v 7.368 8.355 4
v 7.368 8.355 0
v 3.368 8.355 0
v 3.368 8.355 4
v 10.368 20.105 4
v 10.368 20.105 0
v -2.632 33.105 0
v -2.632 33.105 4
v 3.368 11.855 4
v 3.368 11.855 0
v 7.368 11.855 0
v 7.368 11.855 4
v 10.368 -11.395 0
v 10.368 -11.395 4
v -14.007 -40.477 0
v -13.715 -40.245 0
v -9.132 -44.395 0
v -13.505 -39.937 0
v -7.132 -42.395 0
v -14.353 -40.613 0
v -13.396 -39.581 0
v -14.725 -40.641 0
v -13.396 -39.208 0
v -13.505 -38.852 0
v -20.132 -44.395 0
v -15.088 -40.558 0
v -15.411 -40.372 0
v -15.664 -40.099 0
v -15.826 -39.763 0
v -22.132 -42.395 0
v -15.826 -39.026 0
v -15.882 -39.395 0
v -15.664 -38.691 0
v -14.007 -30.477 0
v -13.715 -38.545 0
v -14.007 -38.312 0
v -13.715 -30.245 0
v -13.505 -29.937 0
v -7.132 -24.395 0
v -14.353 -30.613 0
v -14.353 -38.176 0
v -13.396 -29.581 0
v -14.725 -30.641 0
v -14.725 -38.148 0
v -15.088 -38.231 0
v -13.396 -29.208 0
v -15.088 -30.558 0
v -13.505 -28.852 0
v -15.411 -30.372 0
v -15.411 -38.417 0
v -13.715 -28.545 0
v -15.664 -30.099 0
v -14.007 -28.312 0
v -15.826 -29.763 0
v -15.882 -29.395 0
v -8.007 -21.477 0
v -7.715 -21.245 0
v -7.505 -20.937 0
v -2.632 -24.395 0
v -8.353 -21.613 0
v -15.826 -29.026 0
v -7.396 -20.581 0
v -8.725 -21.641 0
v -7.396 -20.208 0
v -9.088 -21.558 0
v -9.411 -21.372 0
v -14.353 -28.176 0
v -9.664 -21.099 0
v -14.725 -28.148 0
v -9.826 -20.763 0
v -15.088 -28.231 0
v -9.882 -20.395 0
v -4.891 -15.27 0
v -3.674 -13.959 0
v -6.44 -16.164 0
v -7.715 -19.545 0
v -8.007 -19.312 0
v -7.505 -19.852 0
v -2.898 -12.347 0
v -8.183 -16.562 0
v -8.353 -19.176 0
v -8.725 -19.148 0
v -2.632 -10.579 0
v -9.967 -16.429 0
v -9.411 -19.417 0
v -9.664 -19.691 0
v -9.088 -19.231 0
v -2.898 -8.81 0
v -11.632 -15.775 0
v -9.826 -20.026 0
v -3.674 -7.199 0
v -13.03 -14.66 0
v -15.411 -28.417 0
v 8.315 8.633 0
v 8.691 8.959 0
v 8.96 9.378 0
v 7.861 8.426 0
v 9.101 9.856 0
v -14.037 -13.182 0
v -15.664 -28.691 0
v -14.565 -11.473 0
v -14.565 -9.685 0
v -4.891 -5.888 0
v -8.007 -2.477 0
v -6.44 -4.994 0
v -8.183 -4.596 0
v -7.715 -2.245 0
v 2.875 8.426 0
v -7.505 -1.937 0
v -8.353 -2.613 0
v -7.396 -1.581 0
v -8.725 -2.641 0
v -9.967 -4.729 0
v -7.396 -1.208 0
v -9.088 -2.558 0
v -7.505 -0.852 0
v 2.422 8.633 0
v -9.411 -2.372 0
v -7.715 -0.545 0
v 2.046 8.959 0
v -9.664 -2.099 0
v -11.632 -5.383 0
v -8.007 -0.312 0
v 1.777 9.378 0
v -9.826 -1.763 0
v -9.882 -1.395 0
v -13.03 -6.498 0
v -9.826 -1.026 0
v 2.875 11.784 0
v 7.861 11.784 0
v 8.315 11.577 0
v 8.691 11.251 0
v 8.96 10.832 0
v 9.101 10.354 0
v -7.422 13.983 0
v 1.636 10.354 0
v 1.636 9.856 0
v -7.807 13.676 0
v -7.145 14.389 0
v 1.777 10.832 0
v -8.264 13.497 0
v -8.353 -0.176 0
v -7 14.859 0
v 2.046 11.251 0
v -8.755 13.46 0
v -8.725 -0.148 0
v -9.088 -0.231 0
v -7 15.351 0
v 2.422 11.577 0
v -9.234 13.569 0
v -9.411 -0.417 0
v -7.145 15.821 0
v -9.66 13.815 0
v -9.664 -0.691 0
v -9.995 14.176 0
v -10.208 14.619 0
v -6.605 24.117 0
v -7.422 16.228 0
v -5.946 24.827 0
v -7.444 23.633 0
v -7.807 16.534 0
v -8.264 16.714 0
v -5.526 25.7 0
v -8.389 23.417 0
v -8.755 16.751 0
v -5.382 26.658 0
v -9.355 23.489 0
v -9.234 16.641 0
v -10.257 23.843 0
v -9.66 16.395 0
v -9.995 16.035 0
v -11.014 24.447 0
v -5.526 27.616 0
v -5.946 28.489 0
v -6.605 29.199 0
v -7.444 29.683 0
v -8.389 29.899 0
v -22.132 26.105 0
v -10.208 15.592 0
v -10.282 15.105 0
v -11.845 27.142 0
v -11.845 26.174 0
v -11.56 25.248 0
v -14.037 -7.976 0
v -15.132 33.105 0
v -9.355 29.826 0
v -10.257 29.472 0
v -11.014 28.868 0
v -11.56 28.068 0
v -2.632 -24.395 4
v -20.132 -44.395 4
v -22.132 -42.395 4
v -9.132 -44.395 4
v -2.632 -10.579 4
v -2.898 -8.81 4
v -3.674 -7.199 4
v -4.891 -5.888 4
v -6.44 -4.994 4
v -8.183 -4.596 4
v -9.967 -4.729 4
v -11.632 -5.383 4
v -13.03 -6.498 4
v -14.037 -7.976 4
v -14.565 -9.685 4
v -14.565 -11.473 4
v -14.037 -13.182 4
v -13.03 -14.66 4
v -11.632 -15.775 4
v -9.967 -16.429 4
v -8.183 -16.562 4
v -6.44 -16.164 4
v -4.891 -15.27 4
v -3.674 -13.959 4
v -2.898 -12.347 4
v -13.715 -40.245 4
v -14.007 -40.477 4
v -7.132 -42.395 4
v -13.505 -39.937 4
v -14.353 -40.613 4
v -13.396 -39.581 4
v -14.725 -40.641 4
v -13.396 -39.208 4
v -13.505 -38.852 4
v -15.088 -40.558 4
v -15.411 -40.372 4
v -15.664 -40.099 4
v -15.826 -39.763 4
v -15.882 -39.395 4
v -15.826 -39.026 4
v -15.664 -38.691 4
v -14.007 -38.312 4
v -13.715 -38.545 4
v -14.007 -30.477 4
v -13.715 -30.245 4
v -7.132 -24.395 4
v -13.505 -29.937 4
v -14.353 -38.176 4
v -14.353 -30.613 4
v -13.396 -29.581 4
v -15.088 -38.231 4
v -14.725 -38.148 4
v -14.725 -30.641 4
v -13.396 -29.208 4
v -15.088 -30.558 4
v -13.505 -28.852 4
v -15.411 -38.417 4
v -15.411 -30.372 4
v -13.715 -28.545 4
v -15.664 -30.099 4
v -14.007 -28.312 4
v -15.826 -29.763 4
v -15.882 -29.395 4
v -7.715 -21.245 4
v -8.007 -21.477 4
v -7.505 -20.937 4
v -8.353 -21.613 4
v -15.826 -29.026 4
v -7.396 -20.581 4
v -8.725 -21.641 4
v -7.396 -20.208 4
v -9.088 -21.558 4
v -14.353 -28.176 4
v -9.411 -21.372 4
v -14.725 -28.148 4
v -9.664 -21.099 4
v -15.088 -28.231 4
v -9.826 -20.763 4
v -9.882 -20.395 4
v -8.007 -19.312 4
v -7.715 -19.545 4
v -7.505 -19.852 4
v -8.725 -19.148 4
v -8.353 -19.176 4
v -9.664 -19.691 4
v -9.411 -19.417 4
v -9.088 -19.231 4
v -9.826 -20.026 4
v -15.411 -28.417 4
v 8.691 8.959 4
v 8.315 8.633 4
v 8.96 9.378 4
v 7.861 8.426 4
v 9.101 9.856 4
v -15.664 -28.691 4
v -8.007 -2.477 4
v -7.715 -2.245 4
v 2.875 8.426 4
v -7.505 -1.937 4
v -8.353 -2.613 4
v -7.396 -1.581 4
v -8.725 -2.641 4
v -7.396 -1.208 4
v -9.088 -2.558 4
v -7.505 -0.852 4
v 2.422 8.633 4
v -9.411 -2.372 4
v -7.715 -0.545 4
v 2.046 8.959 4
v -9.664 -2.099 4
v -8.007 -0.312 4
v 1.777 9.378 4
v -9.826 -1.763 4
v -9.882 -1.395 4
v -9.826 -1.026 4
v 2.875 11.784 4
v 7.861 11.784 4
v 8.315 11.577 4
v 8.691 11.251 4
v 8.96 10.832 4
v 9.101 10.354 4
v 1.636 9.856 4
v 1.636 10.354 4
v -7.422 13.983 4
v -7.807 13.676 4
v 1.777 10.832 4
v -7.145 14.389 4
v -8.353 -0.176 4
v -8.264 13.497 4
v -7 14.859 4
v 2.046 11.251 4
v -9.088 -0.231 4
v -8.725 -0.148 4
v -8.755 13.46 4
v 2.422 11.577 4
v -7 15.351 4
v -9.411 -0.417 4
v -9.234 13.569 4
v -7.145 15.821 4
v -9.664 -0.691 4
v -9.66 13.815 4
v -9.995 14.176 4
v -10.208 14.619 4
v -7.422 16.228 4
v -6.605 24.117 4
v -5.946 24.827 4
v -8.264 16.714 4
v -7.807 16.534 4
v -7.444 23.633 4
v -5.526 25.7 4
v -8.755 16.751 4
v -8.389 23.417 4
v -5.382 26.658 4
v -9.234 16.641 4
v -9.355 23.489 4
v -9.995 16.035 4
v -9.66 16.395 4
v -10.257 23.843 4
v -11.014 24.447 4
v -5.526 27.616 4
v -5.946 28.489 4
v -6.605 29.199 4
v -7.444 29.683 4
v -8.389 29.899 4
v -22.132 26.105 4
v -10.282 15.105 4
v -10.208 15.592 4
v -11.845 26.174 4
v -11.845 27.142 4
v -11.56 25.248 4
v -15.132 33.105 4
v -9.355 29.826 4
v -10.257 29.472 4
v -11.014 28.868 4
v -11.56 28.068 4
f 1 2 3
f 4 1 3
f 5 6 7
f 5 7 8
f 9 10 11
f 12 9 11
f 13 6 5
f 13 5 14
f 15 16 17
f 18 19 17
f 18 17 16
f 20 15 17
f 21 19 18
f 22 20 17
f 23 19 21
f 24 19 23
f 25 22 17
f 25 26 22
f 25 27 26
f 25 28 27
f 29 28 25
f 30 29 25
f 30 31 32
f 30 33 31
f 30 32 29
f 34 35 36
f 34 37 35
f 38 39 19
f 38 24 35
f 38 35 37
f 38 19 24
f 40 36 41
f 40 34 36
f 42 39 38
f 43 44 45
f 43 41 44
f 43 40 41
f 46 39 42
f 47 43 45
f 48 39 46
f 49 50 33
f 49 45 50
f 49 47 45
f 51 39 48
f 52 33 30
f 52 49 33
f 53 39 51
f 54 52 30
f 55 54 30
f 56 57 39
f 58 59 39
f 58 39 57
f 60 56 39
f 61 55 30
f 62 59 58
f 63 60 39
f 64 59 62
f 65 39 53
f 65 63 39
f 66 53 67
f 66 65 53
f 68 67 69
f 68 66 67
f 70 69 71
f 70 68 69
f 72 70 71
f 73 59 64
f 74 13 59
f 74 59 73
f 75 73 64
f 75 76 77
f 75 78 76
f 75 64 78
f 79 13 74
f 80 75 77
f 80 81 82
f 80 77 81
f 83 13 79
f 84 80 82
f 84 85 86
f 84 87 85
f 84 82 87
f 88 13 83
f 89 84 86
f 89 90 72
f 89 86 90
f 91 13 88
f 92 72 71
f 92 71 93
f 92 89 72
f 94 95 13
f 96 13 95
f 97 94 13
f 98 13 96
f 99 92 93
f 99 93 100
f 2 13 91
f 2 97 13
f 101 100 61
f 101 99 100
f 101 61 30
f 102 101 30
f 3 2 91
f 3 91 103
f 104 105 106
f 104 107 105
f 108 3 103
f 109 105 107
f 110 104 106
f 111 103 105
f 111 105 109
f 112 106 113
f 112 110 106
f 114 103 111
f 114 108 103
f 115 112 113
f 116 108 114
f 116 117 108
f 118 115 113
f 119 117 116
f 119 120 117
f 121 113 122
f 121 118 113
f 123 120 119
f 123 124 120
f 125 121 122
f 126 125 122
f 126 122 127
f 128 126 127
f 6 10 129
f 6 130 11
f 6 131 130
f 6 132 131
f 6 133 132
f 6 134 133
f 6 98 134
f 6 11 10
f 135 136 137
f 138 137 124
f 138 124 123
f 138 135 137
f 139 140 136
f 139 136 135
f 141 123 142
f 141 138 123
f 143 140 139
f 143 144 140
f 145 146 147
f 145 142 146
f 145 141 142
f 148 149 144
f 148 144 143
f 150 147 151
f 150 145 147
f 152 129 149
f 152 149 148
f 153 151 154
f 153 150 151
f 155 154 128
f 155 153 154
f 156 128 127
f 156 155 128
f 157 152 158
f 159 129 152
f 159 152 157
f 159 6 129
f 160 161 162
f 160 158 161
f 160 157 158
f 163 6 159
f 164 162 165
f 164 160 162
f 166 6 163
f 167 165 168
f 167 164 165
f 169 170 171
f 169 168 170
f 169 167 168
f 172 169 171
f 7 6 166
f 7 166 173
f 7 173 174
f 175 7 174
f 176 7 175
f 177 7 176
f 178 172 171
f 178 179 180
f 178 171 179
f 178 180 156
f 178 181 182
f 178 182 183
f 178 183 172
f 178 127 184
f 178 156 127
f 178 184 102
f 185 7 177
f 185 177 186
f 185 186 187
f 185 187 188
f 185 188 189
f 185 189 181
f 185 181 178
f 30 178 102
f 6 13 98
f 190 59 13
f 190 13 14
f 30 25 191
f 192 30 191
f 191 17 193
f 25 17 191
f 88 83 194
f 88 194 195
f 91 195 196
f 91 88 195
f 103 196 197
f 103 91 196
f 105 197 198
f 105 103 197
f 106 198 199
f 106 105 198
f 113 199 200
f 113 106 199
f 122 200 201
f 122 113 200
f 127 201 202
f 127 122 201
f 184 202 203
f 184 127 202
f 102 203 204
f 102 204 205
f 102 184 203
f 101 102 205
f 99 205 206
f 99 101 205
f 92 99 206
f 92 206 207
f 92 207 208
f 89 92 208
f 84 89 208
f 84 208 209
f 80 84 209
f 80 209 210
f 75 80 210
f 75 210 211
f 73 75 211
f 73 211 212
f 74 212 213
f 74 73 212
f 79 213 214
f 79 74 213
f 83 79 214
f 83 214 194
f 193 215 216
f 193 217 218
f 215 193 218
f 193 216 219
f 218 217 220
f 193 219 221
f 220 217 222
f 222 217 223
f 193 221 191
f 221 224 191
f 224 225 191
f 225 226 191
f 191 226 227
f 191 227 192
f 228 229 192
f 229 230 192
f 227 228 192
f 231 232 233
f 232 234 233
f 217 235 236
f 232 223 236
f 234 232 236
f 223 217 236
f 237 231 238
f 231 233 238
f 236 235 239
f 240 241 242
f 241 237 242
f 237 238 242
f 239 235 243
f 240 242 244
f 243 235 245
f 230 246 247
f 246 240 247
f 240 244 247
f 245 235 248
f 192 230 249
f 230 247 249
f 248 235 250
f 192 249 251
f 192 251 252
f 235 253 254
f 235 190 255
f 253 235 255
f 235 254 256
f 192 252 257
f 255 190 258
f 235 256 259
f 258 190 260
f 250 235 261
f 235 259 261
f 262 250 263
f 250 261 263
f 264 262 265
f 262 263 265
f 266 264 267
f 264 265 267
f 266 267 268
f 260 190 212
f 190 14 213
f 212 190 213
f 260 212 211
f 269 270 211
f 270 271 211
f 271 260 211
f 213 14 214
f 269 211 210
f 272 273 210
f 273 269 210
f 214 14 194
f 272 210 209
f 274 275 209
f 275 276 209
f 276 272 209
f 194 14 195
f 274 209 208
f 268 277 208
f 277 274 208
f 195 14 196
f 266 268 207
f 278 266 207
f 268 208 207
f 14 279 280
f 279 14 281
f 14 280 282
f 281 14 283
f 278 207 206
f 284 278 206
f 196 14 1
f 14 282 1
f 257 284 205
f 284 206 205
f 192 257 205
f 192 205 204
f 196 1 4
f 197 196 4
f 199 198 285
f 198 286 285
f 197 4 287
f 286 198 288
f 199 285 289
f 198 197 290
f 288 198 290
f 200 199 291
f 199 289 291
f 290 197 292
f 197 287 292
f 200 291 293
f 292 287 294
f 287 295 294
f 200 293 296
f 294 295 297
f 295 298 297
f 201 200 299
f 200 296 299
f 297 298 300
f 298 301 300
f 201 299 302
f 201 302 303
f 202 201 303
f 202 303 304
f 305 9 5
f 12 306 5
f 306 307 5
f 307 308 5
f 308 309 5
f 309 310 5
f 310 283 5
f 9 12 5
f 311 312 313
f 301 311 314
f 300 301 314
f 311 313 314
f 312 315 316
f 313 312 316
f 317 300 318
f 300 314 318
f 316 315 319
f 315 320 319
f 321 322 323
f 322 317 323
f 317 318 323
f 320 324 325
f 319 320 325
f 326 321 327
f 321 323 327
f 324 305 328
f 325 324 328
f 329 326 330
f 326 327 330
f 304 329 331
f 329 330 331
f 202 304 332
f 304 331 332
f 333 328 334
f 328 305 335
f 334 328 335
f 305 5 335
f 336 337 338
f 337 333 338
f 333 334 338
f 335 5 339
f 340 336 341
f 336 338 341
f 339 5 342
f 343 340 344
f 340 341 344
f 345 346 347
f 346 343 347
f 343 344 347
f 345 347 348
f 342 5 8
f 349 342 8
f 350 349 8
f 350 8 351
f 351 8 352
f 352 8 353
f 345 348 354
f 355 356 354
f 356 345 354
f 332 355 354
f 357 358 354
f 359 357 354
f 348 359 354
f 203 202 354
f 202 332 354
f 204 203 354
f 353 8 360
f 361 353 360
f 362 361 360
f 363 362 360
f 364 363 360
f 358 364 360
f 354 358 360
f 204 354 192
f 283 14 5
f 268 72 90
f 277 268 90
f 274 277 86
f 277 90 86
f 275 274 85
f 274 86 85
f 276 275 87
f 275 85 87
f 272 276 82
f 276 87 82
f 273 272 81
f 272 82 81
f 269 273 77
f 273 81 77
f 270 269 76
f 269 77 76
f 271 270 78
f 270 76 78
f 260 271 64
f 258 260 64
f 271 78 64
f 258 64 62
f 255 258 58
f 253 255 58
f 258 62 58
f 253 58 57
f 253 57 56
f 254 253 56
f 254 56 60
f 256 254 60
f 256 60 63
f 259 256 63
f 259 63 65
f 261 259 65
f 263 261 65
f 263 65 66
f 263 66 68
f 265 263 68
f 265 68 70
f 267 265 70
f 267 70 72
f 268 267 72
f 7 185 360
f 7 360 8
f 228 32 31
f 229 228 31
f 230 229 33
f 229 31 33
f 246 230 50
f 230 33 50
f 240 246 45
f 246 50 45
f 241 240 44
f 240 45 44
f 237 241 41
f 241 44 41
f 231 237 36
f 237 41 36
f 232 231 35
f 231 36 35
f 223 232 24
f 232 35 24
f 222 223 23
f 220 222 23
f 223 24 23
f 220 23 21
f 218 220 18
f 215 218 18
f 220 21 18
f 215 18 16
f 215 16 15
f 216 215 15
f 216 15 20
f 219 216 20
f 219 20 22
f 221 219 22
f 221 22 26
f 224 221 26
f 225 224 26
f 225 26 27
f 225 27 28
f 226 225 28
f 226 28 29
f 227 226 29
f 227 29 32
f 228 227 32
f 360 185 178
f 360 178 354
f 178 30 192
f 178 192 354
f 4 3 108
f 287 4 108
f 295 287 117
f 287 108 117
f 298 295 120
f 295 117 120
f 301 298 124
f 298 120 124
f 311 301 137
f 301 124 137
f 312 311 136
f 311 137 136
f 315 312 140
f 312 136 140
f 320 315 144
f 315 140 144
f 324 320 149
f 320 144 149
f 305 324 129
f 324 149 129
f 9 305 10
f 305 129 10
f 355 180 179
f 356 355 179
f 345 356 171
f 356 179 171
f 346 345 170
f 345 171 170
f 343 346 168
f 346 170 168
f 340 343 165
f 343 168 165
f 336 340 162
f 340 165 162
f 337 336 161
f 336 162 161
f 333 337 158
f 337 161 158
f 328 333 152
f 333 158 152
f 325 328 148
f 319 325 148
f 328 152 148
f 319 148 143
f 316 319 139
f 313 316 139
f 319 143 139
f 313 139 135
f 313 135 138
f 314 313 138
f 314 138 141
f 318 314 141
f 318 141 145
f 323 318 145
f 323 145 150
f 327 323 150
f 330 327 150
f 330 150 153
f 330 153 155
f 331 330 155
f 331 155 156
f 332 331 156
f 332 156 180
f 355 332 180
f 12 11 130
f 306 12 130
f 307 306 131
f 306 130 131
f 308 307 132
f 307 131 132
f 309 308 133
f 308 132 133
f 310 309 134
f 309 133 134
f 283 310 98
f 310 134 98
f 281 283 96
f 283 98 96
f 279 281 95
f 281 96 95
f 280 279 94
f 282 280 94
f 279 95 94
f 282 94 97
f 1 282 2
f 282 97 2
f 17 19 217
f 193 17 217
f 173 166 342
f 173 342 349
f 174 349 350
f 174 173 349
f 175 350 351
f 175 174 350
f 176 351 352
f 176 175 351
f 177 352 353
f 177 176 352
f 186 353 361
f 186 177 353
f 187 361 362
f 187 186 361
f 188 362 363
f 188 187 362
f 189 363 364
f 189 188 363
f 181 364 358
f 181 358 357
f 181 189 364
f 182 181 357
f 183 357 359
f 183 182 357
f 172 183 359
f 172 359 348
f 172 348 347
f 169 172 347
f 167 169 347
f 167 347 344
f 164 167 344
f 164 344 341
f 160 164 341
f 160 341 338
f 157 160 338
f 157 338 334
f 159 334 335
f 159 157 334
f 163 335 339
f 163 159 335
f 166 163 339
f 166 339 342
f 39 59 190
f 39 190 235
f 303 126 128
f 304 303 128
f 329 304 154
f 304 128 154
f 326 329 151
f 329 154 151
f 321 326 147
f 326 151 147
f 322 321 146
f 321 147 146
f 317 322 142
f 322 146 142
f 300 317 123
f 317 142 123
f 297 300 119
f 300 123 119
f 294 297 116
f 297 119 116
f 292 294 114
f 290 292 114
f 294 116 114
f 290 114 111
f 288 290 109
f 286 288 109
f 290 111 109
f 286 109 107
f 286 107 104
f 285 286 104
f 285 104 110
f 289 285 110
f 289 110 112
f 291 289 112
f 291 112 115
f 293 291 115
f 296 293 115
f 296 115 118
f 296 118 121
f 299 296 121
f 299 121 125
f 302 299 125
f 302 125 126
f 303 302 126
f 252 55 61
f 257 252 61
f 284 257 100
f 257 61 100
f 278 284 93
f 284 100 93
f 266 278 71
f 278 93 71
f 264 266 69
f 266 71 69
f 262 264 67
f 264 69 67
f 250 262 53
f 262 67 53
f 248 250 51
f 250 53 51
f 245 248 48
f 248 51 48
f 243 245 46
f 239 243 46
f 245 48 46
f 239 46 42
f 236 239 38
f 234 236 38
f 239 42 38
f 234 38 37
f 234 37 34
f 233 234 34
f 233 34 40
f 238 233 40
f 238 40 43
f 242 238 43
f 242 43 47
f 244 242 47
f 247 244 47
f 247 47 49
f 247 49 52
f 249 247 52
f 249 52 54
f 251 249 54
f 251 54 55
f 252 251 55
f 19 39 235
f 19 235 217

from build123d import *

# Parameters (mm, degrees)
SKETCH1_R             = 6
SKETCH1_R_2           = 3.25
BOSS_EXTRUDE1_DEPTH   = 4
CHAMFER1_SIZE         = 7
CHAMFER2_SIZE         = 13
CHAMFER3_SIZE         = 2
M4_TAPPED_HOLE1_D     = 3.3
M4_TAPPED_HOLE1_DEPTH = 10.1
M4_TAPPED_HOLE1_TIP   = 0.991420021
M3_TAPPED_HOLE1_D     = 2.5
M3_TAPPED_HOLE1_DEPTH = 7.5
M3_TAPPED_HOLE1_TIP   = 0.751075774


with BuildPart() as part:
    # Sketch1 → Boss-Extrude1 (new body)
    with BuildSketch(Plane.XY):
        Polygon((-22.131578947, 33.105263158), (10.368421053, 33.105263158), (10.368421053, -24.394736842), (-7.131578947, -24.394736842), (-7.131578947, -44.394736842), (-22.131578947, -44.394736842), align=None)
        with Locations((-8.631578947, -10.578947368)):
            Circle(SKETCH1_R, mode=Mode.SUBTRACT)
        with Locations((-8.631578947, 26.657894737)):
            Circle(SKETCH1_R_2, mode=Mode.SUBTRACT)
        with BuildLine():
            Line((3.368421053, 11.855263158), (7.368421053, 11.855263158))
            ThreePointArc((7.368421053, 11.855263158), (9.118421053, 10.105263158), (7.368421053, 8.355263158))
            Line((7.368421053, 8.355263158), (3.368421053, 8.355263158))
            ThreePointArc((3.368421053, 8.355263158), (1.618421053, 10.105263158), (3.368421053, 11.855263158))
        make_face(mode=Mode.SUBTRACT)
    extrude(amount=BOSS_EXTRUDE1_DEPTH)

    # Chamfer1
    chamfer1_edges = [part.edges().sort_by_distance(p)[0] for p in [
        (-22.131578947, 33.105263158, 2),
    ]]
    chamfer(chamfer1_edges, length=CHAMFER1_SIZE)

    # Chamfer2
    chamfer2_edges = [part.edges().sort_by_distance(p)[0] for p in [
        (10.368421053, 33.105263158, 2),
        (10.368421053, -24.394736842, 2),
    ]]
    chamfer(chamfer2_edges, length=CHAMFER2_SIZE)

    # Chamfer3
    chamfer3_edges = [part.edges().sort_by_distance(p)[0] for p in [
        (-7.131578947, -44.394736842, 2),
        (-22.131578947, -44.394736842, 2),
    ]]
    chamfer(chamfer3_edges, length=CHAMFER3_SIZE)

    # M4 Tapped Hole1
    with Locations(Plane.XY.offset(4)):
        with Locations((-8.631578947, 15.105263158)):
            Hole(M4_TAPPED_HOLE1_D / 2, depth=M4_TAPPED_HOLE1_DEPTH)
            with Locations((0, 0, -(M4_TAPPED_HOLE1_DEPTH + M4_TAPPED_HOLE1_TIP / 2))):  # 118° drill point
                Cone(0, M4_TAPPED_HOLE1_D / 2, M4_TAPPED_HOLE1_TIP, mode=Mode.SUBTRACT)

    # M3 Tapped Hole1
    with Locations(Plane.XY.offset(4)):
        with Locations((-8.631578947, -1.394736842), (-8.631578947, -20.394736842), (-14.631578947, -29.394736842), (-14.631578947, -39.394736842)):
            Hole(M3_TAPPED_HOLE1_D / 2, depth=M3_TAPPED_HOLE1_DEPTH)
            with Locations((0, 0, -(M3_TAPPED_HOLE1_DEPTH + M3_TAPPED_HOLE1_TIP / 2))):  # 118° drill point
                Cone(0, M3_TAPPED_HOLE1_D / 2, M3_TAPPED_HOLE1_TIP, mode=Mode.SUBTRACT)


solid = part.part
